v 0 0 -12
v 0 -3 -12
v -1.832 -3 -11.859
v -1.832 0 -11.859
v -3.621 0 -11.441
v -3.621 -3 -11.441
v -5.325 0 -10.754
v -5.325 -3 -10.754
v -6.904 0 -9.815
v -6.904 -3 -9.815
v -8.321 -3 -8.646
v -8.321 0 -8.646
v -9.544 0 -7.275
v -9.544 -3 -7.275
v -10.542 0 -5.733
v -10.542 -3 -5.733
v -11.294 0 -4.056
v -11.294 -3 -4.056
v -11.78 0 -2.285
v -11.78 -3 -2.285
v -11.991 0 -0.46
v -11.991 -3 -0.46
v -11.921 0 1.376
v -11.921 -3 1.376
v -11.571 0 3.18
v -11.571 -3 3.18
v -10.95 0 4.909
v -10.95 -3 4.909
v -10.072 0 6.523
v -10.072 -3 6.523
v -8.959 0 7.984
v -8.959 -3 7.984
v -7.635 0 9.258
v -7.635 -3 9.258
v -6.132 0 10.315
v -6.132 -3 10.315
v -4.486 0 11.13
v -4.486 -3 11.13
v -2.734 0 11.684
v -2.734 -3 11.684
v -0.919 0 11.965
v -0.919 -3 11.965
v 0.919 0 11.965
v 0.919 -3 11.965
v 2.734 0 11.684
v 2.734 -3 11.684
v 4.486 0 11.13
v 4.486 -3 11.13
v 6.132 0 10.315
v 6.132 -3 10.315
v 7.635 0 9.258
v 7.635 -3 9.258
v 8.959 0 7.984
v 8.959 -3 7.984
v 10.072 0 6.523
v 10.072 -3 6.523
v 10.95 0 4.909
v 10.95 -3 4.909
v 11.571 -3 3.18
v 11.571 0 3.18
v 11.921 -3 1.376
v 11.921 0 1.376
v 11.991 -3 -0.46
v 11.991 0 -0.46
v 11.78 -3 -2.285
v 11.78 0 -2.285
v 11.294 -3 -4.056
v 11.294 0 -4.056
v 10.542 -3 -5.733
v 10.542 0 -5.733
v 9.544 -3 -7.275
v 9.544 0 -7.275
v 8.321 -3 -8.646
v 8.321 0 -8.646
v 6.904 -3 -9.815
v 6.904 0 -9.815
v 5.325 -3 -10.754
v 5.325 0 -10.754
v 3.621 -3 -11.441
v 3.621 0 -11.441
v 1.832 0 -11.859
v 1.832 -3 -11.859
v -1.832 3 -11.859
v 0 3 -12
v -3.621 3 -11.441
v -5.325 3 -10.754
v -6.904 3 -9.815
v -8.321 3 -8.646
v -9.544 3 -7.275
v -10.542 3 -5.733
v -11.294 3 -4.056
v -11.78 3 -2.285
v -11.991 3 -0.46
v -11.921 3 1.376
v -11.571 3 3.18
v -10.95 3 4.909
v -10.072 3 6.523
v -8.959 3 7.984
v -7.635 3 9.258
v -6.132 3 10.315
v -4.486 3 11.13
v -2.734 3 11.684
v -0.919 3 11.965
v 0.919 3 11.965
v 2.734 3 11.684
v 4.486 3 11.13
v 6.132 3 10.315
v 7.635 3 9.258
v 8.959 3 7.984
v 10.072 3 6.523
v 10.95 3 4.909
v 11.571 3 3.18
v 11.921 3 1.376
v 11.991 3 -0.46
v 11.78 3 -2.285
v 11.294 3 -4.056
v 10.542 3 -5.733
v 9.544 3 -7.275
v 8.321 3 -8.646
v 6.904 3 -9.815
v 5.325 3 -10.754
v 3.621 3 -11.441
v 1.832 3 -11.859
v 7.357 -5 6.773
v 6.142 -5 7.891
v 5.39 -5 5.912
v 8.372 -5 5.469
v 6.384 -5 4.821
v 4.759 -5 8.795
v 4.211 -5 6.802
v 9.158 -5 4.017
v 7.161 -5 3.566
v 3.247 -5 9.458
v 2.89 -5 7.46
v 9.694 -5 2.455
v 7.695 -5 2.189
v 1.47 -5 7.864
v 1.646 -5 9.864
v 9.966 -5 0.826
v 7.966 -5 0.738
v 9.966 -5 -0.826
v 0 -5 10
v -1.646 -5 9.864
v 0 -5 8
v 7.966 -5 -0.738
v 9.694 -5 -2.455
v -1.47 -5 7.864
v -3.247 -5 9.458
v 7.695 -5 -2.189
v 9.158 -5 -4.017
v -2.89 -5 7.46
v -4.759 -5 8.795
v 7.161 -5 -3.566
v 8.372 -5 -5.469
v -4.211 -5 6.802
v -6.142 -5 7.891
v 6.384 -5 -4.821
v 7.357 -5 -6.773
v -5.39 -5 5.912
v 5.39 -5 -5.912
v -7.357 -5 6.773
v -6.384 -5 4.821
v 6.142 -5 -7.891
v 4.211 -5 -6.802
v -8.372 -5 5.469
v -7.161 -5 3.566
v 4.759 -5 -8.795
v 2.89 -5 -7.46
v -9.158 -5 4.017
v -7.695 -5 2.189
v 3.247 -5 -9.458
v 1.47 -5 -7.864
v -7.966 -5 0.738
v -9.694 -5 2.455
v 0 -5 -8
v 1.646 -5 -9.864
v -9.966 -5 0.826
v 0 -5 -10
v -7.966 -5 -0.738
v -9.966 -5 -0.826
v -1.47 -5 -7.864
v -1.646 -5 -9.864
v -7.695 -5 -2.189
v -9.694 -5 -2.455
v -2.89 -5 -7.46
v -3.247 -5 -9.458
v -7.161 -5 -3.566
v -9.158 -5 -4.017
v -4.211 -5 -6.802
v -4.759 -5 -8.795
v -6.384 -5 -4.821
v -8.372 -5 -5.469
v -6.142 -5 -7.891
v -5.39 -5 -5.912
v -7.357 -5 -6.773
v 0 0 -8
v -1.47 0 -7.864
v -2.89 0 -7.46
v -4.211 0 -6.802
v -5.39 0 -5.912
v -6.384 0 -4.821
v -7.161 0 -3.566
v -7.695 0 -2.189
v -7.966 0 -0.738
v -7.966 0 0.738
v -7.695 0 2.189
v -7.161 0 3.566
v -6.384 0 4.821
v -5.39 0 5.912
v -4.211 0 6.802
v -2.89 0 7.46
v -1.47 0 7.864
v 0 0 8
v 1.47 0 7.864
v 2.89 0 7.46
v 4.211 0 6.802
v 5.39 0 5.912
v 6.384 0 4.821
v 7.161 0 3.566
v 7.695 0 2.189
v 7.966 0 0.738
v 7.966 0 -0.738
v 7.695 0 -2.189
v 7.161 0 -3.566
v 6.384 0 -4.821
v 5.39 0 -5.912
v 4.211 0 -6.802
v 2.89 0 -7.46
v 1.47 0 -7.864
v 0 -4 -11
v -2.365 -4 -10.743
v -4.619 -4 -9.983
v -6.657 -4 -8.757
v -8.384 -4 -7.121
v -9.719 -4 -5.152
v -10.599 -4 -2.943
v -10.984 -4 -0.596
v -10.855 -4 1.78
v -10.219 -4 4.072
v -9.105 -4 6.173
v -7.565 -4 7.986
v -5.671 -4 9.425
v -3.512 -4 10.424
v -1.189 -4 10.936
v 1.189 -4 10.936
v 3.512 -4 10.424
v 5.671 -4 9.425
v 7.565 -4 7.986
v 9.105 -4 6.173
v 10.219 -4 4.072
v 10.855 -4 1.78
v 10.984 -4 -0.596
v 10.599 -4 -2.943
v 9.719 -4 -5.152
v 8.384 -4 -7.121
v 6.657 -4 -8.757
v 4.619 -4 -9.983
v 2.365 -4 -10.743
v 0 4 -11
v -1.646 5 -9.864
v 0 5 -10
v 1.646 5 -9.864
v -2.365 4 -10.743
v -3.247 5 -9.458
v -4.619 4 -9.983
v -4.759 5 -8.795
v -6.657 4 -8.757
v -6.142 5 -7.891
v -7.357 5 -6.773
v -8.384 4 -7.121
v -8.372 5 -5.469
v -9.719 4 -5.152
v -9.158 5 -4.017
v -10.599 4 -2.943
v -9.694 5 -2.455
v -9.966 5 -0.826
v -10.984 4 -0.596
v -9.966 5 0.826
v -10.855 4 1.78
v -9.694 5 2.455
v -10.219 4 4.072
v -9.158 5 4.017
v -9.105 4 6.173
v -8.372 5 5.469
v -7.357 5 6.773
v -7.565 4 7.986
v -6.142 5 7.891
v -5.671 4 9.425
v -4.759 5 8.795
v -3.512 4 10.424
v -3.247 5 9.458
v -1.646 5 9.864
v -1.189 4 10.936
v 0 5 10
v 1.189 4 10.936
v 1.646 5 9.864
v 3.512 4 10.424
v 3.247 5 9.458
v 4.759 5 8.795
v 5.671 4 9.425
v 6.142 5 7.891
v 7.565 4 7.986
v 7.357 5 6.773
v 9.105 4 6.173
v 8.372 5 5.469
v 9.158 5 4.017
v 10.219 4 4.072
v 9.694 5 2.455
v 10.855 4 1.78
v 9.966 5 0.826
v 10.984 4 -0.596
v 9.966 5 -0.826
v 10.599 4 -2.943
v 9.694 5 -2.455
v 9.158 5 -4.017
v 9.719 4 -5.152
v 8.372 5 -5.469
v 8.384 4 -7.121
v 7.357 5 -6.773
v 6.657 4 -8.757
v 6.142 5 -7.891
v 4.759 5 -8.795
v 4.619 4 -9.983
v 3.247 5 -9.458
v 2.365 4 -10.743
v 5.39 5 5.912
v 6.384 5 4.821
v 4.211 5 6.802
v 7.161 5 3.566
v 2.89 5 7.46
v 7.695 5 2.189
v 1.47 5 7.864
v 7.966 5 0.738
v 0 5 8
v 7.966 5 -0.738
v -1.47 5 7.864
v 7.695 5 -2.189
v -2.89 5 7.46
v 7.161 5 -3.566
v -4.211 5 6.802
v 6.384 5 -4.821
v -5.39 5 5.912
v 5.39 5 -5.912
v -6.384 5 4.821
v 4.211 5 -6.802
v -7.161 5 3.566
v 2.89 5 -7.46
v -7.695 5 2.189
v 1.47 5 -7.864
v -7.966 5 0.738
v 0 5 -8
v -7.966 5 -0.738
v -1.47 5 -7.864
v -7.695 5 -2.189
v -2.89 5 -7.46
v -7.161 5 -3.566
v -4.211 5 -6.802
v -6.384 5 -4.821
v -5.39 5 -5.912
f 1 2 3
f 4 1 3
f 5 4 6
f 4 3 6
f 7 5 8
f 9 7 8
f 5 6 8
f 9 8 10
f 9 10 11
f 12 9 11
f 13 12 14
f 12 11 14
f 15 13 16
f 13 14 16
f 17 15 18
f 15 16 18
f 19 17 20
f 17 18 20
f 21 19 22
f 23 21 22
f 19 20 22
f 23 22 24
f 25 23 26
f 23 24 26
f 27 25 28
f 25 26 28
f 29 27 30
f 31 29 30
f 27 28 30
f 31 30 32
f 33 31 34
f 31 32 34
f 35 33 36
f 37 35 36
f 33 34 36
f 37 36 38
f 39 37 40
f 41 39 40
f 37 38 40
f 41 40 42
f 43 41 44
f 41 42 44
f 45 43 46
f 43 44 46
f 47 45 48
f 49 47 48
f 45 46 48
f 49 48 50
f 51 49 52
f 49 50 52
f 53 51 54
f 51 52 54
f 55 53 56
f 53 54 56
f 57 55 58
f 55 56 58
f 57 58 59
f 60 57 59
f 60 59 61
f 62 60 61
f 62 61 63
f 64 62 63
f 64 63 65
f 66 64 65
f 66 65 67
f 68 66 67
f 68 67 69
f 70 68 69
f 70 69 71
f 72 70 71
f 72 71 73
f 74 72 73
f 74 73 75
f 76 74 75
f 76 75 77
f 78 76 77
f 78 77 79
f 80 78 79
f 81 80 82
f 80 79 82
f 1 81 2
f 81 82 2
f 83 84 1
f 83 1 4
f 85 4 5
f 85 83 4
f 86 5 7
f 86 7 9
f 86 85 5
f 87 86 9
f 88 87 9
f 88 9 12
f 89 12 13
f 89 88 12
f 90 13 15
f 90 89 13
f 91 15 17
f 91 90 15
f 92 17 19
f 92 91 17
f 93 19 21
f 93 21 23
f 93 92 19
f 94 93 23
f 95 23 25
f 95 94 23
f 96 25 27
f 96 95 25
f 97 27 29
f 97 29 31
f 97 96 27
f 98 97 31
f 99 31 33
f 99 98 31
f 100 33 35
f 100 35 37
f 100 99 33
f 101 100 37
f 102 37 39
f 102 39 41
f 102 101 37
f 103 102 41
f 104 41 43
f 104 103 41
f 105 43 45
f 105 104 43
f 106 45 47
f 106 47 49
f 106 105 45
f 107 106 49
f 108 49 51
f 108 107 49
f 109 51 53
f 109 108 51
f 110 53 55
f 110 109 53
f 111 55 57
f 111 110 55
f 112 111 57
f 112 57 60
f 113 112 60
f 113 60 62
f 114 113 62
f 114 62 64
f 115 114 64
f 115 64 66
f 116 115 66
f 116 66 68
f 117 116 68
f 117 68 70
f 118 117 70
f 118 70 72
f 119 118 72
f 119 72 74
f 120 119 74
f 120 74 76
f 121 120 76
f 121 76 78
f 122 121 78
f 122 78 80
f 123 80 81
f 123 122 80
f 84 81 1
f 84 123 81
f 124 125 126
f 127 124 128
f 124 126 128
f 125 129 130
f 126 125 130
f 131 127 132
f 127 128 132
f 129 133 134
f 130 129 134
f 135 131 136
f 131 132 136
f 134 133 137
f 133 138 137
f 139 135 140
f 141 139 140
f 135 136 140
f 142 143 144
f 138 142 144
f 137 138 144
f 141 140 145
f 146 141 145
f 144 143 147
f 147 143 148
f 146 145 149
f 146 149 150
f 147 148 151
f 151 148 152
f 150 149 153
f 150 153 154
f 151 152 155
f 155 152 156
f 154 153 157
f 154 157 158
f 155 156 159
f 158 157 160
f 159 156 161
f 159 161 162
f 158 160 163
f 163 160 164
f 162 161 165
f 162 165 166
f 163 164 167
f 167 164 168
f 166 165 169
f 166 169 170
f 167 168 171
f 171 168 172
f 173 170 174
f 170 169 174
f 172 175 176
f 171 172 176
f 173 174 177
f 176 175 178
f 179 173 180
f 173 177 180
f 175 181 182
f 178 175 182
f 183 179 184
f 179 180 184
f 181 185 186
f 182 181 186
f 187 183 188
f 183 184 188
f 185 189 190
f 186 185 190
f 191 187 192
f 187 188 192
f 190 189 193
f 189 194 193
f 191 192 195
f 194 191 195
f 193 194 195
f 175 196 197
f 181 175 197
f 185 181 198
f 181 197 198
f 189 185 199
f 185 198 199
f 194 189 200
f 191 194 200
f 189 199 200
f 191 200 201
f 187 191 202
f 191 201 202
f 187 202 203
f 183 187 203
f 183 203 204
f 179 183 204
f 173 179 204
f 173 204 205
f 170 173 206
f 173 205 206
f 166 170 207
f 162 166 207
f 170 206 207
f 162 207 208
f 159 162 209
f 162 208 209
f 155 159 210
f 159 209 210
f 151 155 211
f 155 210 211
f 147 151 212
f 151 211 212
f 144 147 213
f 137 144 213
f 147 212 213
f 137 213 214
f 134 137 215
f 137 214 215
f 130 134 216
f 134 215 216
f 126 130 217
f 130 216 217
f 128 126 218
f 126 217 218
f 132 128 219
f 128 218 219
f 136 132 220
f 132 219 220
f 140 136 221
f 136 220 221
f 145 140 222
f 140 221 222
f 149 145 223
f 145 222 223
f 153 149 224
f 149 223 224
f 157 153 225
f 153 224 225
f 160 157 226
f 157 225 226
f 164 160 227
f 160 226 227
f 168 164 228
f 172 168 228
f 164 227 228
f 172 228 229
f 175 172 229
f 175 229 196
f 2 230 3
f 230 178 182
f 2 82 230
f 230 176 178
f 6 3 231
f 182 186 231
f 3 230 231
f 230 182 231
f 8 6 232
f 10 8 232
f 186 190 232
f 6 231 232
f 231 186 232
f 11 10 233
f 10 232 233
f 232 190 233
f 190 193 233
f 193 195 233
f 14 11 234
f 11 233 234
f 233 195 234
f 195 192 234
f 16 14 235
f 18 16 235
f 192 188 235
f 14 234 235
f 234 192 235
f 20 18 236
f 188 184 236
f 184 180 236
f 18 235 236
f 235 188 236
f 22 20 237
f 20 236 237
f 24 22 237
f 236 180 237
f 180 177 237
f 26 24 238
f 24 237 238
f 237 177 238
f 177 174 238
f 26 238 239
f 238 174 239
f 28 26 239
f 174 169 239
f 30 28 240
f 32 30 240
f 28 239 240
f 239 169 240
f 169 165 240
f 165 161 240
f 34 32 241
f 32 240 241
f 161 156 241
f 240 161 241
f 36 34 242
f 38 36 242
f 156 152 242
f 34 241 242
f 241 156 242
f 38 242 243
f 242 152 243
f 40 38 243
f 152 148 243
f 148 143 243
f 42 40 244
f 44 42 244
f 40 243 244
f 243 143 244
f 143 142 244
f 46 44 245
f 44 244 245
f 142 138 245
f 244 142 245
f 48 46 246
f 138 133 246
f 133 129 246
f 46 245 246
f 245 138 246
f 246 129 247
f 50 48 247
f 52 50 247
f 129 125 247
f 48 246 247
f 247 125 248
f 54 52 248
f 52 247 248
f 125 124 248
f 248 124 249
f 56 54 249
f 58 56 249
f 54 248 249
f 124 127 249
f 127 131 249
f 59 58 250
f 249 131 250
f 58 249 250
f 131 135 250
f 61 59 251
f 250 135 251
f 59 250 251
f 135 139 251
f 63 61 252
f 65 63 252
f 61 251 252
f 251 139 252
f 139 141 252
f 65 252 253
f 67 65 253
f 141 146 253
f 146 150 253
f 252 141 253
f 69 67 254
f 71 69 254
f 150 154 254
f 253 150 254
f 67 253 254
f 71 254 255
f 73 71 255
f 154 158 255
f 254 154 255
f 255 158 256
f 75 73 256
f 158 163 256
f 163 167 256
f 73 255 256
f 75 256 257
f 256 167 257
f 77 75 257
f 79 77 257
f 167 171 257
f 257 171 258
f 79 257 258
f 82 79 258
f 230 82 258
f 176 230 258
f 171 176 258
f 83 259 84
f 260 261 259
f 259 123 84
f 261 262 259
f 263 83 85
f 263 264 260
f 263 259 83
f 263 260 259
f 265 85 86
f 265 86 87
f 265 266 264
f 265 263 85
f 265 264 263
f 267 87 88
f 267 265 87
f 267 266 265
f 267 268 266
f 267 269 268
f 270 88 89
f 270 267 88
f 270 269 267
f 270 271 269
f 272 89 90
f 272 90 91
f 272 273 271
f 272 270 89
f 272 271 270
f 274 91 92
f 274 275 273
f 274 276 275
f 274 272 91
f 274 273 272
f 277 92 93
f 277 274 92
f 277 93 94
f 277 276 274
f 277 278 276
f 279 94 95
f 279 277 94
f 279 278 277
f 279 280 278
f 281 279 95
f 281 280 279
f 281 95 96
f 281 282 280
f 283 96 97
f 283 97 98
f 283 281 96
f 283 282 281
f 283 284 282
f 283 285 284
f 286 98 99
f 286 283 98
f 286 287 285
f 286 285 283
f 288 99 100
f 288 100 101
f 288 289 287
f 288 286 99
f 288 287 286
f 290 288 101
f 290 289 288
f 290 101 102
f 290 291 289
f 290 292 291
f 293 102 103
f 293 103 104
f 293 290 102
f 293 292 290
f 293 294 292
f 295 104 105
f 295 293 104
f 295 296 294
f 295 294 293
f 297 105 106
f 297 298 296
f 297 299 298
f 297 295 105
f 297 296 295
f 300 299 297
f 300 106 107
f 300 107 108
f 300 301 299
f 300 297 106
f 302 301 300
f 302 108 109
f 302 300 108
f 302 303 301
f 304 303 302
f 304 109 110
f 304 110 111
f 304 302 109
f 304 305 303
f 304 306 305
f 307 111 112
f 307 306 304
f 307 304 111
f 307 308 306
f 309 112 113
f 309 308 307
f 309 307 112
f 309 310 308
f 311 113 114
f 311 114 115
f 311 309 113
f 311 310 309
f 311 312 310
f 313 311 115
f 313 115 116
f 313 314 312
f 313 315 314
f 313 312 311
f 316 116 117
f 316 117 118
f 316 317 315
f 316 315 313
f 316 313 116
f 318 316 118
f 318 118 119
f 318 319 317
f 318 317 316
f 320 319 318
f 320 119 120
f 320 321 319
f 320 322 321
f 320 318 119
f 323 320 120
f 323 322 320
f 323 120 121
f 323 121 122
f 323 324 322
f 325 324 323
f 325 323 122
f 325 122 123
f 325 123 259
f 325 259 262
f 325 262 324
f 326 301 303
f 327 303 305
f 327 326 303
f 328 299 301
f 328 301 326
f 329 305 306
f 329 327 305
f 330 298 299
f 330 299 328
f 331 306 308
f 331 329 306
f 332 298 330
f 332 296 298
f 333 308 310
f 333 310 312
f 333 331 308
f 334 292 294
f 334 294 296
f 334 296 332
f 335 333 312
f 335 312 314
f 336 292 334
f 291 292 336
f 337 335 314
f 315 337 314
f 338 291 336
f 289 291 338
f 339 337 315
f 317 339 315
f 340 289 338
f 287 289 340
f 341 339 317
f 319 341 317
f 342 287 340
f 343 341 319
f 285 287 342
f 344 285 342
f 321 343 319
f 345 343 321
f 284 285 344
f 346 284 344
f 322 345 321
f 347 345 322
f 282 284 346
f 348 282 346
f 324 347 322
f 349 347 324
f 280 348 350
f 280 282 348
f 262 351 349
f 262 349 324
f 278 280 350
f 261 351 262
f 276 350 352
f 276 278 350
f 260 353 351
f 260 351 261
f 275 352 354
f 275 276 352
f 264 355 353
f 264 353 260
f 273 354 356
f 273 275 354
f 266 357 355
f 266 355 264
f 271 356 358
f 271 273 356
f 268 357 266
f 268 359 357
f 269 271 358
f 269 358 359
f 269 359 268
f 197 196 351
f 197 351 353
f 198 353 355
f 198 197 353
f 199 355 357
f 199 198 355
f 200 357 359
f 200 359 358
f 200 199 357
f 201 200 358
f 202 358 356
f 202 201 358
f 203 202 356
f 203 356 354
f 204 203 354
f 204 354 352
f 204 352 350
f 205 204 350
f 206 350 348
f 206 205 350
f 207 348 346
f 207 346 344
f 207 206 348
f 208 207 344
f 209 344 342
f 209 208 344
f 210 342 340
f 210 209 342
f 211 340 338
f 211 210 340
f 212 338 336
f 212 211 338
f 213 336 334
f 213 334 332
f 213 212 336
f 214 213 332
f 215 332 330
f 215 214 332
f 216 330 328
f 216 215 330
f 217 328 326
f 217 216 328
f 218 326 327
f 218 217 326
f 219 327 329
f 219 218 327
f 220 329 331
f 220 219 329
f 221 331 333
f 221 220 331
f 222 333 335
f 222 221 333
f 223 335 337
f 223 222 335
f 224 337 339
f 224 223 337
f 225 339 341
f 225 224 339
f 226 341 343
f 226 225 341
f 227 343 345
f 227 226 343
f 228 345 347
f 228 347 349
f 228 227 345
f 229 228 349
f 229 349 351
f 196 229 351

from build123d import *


with BuildPart() as part:
    # Sketch1 → Revolve2 (revolve)
    with BuildSketch(Plane.XY, mode=Mode.PRIVATE) as revolve2_sk:
        Polygon((8, 5), (8, 0), (12, 0), (12, 3), (10, 5), align=None)
    revolve2 = revolve(revolve2_sk.sketch.rotate(Axis((0, 0, 0), (0, 1, 0)), 90), axis=Axis((0, 0, 0), (0, 1, 0)))

    # Mirror1: Revolve2 across plane
    add(revolve2.mirror(Plane(origin=(0, 0, 0), x_dir=(0, 0, 1), z_dir=(0, -1, 0))))


solid = part.part
